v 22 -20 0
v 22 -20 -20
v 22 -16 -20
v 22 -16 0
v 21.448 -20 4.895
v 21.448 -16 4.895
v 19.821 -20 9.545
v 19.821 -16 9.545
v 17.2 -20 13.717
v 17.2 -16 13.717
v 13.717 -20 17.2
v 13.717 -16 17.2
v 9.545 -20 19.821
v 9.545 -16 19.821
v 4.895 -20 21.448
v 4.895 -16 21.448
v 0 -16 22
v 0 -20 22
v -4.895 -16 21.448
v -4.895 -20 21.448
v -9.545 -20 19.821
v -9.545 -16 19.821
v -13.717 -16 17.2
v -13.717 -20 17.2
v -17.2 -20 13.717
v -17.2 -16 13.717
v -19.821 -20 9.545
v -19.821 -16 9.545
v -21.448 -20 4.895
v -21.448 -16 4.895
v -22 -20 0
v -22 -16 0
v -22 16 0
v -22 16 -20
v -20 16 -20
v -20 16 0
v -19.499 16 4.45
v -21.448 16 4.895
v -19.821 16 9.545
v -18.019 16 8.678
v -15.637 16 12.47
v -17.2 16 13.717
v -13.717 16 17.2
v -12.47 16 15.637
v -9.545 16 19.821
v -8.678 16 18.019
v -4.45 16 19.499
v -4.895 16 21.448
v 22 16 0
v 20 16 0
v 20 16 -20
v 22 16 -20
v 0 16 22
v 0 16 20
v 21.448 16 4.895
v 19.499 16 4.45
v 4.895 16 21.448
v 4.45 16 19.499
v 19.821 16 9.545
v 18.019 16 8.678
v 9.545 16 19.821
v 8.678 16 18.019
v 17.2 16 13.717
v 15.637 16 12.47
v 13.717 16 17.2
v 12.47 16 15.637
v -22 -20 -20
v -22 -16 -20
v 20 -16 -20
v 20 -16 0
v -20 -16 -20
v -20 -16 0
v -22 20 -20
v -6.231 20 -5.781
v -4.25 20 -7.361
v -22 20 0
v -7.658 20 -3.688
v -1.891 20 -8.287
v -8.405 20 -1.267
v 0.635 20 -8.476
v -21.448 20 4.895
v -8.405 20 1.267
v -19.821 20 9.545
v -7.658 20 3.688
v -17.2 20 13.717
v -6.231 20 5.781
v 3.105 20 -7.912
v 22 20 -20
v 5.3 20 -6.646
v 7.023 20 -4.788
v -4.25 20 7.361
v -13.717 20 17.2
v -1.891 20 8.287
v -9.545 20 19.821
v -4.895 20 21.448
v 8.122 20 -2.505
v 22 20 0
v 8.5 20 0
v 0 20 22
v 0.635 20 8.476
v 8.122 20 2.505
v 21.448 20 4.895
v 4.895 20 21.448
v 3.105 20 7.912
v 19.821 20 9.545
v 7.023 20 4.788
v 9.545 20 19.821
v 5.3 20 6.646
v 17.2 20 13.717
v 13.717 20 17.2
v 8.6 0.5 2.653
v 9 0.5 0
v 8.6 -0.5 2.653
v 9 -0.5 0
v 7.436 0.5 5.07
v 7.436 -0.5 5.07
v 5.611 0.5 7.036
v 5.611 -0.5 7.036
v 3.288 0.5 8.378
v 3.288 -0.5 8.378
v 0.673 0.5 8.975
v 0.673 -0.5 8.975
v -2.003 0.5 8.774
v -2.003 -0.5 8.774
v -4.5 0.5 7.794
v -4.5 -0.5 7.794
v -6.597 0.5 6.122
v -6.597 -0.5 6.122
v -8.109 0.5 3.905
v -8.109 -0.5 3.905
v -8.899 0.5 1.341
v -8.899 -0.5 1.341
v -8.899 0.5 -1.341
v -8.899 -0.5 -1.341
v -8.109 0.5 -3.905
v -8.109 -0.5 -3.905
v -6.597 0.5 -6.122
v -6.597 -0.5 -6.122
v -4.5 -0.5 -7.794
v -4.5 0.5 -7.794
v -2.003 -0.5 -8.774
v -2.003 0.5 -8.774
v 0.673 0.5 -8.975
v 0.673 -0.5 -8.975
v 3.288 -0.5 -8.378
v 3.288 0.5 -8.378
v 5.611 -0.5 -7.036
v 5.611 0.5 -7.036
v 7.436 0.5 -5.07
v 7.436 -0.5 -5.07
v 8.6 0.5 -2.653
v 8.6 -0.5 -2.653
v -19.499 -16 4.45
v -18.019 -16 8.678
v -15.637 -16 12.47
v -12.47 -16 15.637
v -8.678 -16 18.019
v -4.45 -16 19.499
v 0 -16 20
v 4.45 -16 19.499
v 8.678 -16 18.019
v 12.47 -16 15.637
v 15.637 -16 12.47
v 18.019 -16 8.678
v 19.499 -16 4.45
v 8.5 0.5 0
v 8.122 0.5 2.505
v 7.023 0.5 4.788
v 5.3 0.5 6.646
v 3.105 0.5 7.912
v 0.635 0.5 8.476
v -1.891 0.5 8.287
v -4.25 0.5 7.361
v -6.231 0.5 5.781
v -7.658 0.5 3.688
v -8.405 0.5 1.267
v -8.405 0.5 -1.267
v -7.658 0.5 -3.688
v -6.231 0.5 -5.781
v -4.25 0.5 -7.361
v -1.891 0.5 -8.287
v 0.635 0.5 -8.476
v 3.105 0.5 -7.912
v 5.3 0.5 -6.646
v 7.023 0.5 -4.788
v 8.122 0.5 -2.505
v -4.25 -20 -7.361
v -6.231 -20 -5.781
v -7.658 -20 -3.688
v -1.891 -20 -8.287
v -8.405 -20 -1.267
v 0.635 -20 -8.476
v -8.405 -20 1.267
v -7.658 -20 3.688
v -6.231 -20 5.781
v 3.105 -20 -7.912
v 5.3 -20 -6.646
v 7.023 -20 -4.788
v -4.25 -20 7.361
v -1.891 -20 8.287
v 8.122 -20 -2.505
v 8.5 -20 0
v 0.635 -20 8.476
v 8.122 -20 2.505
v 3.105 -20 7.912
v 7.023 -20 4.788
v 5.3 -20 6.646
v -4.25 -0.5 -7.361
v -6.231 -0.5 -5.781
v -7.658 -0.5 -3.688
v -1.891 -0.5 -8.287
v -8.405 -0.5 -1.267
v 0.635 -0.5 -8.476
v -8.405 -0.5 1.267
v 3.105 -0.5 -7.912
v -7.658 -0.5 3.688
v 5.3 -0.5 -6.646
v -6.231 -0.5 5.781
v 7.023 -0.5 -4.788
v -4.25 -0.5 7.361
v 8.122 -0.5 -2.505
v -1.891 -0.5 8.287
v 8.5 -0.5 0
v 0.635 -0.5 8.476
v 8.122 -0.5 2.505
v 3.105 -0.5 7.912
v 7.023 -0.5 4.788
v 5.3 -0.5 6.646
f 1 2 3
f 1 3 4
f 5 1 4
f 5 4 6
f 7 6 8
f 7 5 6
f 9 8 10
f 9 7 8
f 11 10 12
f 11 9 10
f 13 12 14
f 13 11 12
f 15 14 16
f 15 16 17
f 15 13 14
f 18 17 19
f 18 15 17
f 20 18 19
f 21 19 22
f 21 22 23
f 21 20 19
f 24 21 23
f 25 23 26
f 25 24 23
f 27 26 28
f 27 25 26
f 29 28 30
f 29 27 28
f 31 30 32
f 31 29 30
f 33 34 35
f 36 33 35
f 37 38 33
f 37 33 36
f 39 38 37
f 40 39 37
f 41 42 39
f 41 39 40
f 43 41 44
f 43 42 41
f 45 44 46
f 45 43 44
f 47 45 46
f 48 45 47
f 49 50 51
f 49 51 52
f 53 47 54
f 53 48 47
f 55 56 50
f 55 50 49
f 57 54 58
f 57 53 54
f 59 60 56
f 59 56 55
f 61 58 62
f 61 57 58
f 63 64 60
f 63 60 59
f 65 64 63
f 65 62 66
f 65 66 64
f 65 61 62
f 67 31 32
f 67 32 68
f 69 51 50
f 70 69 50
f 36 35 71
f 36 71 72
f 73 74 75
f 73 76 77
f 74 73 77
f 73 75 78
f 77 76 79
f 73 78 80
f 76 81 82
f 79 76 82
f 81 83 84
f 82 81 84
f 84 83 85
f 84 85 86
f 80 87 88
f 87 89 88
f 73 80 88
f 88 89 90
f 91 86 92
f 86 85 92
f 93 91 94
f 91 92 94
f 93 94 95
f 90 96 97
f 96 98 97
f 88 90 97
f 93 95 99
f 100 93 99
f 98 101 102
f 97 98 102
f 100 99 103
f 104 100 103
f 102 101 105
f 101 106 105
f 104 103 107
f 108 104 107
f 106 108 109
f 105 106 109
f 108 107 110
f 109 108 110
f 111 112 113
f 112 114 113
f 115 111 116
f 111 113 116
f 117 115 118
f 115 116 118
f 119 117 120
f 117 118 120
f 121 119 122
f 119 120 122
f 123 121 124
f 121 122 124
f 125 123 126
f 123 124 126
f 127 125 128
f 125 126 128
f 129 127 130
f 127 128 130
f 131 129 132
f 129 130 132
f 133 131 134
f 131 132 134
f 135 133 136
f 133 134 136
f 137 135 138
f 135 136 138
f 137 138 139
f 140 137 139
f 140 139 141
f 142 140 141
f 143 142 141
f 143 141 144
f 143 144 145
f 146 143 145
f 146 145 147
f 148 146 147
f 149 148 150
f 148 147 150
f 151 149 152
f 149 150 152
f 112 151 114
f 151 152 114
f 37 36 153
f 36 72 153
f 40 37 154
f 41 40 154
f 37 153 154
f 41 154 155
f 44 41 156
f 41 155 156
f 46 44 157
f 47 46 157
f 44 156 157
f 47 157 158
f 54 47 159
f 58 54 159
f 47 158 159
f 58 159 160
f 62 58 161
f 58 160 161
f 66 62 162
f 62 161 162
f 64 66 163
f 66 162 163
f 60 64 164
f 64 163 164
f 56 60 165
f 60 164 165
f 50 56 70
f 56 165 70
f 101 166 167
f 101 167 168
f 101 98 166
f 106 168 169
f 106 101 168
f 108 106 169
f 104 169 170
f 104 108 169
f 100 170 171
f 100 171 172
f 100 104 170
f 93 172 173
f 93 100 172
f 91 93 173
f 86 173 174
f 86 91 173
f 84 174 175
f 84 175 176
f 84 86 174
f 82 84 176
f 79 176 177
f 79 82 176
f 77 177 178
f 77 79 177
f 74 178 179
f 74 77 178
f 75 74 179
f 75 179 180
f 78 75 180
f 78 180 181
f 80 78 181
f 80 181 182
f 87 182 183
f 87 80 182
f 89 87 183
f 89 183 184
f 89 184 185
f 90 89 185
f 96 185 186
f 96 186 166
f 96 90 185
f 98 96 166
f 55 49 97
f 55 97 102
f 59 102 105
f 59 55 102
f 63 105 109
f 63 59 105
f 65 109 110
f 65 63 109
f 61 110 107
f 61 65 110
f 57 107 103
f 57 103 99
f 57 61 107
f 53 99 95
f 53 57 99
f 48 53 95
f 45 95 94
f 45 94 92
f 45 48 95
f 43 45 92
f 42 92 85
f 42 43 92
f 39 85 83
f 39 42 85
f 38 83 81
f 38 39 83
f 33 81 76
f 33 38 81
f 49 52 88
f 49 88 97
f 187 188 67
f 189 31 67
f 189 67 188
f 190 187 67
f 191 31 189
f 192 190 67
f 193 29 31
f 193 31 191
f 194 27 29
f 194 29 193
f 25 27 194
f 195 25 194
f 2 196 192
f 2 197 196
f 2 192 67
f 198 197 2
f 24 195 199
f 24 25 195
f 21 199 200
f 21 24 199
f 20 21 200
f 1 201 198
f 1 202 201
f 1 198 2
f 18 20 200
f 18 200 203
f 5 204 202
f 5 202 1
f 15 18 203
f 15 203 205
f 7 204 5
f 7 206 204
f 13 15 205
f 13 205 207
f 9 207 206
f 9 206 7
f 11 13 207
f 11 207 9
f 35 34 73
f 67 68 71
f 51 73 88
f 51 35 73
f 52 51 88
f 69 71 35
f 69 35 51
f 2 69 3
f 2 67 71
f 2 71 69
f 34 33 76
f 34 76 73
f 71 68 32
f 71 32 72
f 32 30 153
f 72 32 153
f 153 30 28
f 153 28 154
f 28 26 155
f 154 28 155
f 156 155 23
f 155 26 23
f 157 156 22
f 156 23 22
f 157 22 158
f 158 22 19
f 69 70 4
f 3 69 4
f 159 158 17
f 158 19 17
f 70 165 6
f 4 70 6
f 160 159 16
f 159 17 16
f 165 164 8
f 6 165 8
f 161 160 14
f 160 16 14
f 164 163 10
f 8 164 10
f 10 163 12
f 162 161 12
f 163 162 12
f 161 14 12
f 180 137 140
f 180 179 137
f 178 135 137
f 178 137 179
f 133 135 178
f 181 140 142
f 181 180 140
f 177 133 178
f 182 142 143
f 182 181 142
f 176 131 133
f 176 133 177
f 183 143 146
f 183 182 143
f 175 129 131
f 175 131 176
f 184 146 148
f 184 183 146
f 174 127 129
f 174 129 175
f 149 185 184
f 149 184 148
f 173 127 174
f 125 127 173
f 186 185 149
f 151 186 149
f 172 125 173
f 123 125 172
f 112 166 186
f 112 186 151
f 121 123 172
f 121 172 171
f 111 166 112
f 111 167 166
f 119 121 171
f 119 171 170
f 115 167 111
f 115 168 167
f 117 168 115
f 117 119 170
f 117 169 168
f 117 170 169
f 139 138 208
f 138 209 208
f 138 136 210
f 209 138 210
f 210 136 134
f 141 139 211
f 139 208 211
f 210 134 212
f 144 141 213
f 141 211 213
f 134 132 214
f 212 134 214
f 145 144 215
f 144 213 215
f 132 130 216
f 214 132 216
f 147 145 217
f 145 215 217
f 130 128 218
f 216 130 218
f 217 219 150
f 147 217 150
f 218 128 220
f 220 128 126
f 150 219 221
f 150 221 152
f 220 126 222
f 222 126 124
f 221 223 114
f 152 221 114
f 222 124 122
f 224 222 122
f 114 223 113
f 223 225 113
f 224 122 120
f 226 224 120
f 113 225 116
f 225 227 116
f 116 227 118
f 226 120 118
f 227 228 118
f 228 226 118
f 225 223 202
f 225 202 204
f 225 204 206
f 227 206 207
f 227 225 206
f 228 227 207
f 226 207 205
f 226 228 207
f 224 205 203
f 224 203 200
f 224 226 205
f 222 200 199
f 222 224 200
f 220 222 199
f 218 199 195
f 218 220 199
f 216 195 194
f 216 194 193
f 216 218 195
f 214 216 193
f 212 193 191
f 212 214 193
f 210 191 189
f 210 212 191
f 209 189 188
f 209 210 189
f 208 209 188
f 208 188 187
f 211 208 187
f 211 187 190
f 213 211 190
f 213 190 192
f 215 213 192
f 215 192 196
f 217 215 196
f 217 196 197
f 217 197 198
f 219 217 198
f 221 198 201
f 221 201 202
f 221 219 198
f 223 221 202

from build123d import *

# Parameters (mm, degrees)
F0_R     = 9
F0_R_2   = 8.5
F0_W     = 2
F0_H     = 20
F1_DEPTH = 20
F2_DEPTH = 0.5
F3_DEPTH = 16


with BuildPart() as f1:
    # F0 (on Front) → F1 (new body, symmetric)
    with BuildSketch(Plane.XZ):
        with BuildLine():
            Line((20, -20), (20, 0))
            ThreePointArc((20, 0), (0, 20), (-20, 0))
            Line((-20, 0), (-20, -20))
            Line((-20, -20), (20, -20))
        make_face()
        Circle(F0_R, mode=Mode.SUBTRACT)
        with BuildLine():
            ThreePointArc((-20, 0), (0, 20), (20, 0))
            Line((20, 0), (22, 0))
            ThreePointArc((22, 0), (0, 22), (-22, 0))
            Line((-22, 0), (-22, -20))
            Line((-22, -20), (-20, -20))
            Line((-20, -20), (-20, 0))
        make_face()
        with Locations((21, -10)):
            Rectangle(F0_W, F0_H)
        Circle(F0_R)
        Circle(F0_R_2, mode=Mode.SUBTRACT)
    extrude(amount=F1_DEPTH, both=True)

    # F0 (on Front) → F2 (cut, symmetric)
    with BuildSketch(Plane.XZ):
        Circle(F0_R)
        Circle(F0_R_2, mode=Mode.SUBTRACT)
    extrude(amount=F2_DEPTH, both=True, mode=Mode.SUBTRACT)

    # F0 (on Front) → F3 (cut, symmetric)
    with BuildSketch(Plane.XZ):
        with BuildLine():
            ThreePointArc((-20, 0), (0, 20), (20, 0))
            Line((20, 0), (22, 0))
            ThreePointArc((22, 0), (0, 22), (-22, 0))
            Line((-22, 0), (-22, -20))
            Line((-22, -20), (-20, -20))
            Line((-20, -20), (-20, 0))
        make_face()
        with Locations((21, -10)):
            Rectangle(F0_W, F0_H)
    extrude(amount=F3_DEPTH, both=True, mode=Mode.SUBTRACT)


solid = f1.part
